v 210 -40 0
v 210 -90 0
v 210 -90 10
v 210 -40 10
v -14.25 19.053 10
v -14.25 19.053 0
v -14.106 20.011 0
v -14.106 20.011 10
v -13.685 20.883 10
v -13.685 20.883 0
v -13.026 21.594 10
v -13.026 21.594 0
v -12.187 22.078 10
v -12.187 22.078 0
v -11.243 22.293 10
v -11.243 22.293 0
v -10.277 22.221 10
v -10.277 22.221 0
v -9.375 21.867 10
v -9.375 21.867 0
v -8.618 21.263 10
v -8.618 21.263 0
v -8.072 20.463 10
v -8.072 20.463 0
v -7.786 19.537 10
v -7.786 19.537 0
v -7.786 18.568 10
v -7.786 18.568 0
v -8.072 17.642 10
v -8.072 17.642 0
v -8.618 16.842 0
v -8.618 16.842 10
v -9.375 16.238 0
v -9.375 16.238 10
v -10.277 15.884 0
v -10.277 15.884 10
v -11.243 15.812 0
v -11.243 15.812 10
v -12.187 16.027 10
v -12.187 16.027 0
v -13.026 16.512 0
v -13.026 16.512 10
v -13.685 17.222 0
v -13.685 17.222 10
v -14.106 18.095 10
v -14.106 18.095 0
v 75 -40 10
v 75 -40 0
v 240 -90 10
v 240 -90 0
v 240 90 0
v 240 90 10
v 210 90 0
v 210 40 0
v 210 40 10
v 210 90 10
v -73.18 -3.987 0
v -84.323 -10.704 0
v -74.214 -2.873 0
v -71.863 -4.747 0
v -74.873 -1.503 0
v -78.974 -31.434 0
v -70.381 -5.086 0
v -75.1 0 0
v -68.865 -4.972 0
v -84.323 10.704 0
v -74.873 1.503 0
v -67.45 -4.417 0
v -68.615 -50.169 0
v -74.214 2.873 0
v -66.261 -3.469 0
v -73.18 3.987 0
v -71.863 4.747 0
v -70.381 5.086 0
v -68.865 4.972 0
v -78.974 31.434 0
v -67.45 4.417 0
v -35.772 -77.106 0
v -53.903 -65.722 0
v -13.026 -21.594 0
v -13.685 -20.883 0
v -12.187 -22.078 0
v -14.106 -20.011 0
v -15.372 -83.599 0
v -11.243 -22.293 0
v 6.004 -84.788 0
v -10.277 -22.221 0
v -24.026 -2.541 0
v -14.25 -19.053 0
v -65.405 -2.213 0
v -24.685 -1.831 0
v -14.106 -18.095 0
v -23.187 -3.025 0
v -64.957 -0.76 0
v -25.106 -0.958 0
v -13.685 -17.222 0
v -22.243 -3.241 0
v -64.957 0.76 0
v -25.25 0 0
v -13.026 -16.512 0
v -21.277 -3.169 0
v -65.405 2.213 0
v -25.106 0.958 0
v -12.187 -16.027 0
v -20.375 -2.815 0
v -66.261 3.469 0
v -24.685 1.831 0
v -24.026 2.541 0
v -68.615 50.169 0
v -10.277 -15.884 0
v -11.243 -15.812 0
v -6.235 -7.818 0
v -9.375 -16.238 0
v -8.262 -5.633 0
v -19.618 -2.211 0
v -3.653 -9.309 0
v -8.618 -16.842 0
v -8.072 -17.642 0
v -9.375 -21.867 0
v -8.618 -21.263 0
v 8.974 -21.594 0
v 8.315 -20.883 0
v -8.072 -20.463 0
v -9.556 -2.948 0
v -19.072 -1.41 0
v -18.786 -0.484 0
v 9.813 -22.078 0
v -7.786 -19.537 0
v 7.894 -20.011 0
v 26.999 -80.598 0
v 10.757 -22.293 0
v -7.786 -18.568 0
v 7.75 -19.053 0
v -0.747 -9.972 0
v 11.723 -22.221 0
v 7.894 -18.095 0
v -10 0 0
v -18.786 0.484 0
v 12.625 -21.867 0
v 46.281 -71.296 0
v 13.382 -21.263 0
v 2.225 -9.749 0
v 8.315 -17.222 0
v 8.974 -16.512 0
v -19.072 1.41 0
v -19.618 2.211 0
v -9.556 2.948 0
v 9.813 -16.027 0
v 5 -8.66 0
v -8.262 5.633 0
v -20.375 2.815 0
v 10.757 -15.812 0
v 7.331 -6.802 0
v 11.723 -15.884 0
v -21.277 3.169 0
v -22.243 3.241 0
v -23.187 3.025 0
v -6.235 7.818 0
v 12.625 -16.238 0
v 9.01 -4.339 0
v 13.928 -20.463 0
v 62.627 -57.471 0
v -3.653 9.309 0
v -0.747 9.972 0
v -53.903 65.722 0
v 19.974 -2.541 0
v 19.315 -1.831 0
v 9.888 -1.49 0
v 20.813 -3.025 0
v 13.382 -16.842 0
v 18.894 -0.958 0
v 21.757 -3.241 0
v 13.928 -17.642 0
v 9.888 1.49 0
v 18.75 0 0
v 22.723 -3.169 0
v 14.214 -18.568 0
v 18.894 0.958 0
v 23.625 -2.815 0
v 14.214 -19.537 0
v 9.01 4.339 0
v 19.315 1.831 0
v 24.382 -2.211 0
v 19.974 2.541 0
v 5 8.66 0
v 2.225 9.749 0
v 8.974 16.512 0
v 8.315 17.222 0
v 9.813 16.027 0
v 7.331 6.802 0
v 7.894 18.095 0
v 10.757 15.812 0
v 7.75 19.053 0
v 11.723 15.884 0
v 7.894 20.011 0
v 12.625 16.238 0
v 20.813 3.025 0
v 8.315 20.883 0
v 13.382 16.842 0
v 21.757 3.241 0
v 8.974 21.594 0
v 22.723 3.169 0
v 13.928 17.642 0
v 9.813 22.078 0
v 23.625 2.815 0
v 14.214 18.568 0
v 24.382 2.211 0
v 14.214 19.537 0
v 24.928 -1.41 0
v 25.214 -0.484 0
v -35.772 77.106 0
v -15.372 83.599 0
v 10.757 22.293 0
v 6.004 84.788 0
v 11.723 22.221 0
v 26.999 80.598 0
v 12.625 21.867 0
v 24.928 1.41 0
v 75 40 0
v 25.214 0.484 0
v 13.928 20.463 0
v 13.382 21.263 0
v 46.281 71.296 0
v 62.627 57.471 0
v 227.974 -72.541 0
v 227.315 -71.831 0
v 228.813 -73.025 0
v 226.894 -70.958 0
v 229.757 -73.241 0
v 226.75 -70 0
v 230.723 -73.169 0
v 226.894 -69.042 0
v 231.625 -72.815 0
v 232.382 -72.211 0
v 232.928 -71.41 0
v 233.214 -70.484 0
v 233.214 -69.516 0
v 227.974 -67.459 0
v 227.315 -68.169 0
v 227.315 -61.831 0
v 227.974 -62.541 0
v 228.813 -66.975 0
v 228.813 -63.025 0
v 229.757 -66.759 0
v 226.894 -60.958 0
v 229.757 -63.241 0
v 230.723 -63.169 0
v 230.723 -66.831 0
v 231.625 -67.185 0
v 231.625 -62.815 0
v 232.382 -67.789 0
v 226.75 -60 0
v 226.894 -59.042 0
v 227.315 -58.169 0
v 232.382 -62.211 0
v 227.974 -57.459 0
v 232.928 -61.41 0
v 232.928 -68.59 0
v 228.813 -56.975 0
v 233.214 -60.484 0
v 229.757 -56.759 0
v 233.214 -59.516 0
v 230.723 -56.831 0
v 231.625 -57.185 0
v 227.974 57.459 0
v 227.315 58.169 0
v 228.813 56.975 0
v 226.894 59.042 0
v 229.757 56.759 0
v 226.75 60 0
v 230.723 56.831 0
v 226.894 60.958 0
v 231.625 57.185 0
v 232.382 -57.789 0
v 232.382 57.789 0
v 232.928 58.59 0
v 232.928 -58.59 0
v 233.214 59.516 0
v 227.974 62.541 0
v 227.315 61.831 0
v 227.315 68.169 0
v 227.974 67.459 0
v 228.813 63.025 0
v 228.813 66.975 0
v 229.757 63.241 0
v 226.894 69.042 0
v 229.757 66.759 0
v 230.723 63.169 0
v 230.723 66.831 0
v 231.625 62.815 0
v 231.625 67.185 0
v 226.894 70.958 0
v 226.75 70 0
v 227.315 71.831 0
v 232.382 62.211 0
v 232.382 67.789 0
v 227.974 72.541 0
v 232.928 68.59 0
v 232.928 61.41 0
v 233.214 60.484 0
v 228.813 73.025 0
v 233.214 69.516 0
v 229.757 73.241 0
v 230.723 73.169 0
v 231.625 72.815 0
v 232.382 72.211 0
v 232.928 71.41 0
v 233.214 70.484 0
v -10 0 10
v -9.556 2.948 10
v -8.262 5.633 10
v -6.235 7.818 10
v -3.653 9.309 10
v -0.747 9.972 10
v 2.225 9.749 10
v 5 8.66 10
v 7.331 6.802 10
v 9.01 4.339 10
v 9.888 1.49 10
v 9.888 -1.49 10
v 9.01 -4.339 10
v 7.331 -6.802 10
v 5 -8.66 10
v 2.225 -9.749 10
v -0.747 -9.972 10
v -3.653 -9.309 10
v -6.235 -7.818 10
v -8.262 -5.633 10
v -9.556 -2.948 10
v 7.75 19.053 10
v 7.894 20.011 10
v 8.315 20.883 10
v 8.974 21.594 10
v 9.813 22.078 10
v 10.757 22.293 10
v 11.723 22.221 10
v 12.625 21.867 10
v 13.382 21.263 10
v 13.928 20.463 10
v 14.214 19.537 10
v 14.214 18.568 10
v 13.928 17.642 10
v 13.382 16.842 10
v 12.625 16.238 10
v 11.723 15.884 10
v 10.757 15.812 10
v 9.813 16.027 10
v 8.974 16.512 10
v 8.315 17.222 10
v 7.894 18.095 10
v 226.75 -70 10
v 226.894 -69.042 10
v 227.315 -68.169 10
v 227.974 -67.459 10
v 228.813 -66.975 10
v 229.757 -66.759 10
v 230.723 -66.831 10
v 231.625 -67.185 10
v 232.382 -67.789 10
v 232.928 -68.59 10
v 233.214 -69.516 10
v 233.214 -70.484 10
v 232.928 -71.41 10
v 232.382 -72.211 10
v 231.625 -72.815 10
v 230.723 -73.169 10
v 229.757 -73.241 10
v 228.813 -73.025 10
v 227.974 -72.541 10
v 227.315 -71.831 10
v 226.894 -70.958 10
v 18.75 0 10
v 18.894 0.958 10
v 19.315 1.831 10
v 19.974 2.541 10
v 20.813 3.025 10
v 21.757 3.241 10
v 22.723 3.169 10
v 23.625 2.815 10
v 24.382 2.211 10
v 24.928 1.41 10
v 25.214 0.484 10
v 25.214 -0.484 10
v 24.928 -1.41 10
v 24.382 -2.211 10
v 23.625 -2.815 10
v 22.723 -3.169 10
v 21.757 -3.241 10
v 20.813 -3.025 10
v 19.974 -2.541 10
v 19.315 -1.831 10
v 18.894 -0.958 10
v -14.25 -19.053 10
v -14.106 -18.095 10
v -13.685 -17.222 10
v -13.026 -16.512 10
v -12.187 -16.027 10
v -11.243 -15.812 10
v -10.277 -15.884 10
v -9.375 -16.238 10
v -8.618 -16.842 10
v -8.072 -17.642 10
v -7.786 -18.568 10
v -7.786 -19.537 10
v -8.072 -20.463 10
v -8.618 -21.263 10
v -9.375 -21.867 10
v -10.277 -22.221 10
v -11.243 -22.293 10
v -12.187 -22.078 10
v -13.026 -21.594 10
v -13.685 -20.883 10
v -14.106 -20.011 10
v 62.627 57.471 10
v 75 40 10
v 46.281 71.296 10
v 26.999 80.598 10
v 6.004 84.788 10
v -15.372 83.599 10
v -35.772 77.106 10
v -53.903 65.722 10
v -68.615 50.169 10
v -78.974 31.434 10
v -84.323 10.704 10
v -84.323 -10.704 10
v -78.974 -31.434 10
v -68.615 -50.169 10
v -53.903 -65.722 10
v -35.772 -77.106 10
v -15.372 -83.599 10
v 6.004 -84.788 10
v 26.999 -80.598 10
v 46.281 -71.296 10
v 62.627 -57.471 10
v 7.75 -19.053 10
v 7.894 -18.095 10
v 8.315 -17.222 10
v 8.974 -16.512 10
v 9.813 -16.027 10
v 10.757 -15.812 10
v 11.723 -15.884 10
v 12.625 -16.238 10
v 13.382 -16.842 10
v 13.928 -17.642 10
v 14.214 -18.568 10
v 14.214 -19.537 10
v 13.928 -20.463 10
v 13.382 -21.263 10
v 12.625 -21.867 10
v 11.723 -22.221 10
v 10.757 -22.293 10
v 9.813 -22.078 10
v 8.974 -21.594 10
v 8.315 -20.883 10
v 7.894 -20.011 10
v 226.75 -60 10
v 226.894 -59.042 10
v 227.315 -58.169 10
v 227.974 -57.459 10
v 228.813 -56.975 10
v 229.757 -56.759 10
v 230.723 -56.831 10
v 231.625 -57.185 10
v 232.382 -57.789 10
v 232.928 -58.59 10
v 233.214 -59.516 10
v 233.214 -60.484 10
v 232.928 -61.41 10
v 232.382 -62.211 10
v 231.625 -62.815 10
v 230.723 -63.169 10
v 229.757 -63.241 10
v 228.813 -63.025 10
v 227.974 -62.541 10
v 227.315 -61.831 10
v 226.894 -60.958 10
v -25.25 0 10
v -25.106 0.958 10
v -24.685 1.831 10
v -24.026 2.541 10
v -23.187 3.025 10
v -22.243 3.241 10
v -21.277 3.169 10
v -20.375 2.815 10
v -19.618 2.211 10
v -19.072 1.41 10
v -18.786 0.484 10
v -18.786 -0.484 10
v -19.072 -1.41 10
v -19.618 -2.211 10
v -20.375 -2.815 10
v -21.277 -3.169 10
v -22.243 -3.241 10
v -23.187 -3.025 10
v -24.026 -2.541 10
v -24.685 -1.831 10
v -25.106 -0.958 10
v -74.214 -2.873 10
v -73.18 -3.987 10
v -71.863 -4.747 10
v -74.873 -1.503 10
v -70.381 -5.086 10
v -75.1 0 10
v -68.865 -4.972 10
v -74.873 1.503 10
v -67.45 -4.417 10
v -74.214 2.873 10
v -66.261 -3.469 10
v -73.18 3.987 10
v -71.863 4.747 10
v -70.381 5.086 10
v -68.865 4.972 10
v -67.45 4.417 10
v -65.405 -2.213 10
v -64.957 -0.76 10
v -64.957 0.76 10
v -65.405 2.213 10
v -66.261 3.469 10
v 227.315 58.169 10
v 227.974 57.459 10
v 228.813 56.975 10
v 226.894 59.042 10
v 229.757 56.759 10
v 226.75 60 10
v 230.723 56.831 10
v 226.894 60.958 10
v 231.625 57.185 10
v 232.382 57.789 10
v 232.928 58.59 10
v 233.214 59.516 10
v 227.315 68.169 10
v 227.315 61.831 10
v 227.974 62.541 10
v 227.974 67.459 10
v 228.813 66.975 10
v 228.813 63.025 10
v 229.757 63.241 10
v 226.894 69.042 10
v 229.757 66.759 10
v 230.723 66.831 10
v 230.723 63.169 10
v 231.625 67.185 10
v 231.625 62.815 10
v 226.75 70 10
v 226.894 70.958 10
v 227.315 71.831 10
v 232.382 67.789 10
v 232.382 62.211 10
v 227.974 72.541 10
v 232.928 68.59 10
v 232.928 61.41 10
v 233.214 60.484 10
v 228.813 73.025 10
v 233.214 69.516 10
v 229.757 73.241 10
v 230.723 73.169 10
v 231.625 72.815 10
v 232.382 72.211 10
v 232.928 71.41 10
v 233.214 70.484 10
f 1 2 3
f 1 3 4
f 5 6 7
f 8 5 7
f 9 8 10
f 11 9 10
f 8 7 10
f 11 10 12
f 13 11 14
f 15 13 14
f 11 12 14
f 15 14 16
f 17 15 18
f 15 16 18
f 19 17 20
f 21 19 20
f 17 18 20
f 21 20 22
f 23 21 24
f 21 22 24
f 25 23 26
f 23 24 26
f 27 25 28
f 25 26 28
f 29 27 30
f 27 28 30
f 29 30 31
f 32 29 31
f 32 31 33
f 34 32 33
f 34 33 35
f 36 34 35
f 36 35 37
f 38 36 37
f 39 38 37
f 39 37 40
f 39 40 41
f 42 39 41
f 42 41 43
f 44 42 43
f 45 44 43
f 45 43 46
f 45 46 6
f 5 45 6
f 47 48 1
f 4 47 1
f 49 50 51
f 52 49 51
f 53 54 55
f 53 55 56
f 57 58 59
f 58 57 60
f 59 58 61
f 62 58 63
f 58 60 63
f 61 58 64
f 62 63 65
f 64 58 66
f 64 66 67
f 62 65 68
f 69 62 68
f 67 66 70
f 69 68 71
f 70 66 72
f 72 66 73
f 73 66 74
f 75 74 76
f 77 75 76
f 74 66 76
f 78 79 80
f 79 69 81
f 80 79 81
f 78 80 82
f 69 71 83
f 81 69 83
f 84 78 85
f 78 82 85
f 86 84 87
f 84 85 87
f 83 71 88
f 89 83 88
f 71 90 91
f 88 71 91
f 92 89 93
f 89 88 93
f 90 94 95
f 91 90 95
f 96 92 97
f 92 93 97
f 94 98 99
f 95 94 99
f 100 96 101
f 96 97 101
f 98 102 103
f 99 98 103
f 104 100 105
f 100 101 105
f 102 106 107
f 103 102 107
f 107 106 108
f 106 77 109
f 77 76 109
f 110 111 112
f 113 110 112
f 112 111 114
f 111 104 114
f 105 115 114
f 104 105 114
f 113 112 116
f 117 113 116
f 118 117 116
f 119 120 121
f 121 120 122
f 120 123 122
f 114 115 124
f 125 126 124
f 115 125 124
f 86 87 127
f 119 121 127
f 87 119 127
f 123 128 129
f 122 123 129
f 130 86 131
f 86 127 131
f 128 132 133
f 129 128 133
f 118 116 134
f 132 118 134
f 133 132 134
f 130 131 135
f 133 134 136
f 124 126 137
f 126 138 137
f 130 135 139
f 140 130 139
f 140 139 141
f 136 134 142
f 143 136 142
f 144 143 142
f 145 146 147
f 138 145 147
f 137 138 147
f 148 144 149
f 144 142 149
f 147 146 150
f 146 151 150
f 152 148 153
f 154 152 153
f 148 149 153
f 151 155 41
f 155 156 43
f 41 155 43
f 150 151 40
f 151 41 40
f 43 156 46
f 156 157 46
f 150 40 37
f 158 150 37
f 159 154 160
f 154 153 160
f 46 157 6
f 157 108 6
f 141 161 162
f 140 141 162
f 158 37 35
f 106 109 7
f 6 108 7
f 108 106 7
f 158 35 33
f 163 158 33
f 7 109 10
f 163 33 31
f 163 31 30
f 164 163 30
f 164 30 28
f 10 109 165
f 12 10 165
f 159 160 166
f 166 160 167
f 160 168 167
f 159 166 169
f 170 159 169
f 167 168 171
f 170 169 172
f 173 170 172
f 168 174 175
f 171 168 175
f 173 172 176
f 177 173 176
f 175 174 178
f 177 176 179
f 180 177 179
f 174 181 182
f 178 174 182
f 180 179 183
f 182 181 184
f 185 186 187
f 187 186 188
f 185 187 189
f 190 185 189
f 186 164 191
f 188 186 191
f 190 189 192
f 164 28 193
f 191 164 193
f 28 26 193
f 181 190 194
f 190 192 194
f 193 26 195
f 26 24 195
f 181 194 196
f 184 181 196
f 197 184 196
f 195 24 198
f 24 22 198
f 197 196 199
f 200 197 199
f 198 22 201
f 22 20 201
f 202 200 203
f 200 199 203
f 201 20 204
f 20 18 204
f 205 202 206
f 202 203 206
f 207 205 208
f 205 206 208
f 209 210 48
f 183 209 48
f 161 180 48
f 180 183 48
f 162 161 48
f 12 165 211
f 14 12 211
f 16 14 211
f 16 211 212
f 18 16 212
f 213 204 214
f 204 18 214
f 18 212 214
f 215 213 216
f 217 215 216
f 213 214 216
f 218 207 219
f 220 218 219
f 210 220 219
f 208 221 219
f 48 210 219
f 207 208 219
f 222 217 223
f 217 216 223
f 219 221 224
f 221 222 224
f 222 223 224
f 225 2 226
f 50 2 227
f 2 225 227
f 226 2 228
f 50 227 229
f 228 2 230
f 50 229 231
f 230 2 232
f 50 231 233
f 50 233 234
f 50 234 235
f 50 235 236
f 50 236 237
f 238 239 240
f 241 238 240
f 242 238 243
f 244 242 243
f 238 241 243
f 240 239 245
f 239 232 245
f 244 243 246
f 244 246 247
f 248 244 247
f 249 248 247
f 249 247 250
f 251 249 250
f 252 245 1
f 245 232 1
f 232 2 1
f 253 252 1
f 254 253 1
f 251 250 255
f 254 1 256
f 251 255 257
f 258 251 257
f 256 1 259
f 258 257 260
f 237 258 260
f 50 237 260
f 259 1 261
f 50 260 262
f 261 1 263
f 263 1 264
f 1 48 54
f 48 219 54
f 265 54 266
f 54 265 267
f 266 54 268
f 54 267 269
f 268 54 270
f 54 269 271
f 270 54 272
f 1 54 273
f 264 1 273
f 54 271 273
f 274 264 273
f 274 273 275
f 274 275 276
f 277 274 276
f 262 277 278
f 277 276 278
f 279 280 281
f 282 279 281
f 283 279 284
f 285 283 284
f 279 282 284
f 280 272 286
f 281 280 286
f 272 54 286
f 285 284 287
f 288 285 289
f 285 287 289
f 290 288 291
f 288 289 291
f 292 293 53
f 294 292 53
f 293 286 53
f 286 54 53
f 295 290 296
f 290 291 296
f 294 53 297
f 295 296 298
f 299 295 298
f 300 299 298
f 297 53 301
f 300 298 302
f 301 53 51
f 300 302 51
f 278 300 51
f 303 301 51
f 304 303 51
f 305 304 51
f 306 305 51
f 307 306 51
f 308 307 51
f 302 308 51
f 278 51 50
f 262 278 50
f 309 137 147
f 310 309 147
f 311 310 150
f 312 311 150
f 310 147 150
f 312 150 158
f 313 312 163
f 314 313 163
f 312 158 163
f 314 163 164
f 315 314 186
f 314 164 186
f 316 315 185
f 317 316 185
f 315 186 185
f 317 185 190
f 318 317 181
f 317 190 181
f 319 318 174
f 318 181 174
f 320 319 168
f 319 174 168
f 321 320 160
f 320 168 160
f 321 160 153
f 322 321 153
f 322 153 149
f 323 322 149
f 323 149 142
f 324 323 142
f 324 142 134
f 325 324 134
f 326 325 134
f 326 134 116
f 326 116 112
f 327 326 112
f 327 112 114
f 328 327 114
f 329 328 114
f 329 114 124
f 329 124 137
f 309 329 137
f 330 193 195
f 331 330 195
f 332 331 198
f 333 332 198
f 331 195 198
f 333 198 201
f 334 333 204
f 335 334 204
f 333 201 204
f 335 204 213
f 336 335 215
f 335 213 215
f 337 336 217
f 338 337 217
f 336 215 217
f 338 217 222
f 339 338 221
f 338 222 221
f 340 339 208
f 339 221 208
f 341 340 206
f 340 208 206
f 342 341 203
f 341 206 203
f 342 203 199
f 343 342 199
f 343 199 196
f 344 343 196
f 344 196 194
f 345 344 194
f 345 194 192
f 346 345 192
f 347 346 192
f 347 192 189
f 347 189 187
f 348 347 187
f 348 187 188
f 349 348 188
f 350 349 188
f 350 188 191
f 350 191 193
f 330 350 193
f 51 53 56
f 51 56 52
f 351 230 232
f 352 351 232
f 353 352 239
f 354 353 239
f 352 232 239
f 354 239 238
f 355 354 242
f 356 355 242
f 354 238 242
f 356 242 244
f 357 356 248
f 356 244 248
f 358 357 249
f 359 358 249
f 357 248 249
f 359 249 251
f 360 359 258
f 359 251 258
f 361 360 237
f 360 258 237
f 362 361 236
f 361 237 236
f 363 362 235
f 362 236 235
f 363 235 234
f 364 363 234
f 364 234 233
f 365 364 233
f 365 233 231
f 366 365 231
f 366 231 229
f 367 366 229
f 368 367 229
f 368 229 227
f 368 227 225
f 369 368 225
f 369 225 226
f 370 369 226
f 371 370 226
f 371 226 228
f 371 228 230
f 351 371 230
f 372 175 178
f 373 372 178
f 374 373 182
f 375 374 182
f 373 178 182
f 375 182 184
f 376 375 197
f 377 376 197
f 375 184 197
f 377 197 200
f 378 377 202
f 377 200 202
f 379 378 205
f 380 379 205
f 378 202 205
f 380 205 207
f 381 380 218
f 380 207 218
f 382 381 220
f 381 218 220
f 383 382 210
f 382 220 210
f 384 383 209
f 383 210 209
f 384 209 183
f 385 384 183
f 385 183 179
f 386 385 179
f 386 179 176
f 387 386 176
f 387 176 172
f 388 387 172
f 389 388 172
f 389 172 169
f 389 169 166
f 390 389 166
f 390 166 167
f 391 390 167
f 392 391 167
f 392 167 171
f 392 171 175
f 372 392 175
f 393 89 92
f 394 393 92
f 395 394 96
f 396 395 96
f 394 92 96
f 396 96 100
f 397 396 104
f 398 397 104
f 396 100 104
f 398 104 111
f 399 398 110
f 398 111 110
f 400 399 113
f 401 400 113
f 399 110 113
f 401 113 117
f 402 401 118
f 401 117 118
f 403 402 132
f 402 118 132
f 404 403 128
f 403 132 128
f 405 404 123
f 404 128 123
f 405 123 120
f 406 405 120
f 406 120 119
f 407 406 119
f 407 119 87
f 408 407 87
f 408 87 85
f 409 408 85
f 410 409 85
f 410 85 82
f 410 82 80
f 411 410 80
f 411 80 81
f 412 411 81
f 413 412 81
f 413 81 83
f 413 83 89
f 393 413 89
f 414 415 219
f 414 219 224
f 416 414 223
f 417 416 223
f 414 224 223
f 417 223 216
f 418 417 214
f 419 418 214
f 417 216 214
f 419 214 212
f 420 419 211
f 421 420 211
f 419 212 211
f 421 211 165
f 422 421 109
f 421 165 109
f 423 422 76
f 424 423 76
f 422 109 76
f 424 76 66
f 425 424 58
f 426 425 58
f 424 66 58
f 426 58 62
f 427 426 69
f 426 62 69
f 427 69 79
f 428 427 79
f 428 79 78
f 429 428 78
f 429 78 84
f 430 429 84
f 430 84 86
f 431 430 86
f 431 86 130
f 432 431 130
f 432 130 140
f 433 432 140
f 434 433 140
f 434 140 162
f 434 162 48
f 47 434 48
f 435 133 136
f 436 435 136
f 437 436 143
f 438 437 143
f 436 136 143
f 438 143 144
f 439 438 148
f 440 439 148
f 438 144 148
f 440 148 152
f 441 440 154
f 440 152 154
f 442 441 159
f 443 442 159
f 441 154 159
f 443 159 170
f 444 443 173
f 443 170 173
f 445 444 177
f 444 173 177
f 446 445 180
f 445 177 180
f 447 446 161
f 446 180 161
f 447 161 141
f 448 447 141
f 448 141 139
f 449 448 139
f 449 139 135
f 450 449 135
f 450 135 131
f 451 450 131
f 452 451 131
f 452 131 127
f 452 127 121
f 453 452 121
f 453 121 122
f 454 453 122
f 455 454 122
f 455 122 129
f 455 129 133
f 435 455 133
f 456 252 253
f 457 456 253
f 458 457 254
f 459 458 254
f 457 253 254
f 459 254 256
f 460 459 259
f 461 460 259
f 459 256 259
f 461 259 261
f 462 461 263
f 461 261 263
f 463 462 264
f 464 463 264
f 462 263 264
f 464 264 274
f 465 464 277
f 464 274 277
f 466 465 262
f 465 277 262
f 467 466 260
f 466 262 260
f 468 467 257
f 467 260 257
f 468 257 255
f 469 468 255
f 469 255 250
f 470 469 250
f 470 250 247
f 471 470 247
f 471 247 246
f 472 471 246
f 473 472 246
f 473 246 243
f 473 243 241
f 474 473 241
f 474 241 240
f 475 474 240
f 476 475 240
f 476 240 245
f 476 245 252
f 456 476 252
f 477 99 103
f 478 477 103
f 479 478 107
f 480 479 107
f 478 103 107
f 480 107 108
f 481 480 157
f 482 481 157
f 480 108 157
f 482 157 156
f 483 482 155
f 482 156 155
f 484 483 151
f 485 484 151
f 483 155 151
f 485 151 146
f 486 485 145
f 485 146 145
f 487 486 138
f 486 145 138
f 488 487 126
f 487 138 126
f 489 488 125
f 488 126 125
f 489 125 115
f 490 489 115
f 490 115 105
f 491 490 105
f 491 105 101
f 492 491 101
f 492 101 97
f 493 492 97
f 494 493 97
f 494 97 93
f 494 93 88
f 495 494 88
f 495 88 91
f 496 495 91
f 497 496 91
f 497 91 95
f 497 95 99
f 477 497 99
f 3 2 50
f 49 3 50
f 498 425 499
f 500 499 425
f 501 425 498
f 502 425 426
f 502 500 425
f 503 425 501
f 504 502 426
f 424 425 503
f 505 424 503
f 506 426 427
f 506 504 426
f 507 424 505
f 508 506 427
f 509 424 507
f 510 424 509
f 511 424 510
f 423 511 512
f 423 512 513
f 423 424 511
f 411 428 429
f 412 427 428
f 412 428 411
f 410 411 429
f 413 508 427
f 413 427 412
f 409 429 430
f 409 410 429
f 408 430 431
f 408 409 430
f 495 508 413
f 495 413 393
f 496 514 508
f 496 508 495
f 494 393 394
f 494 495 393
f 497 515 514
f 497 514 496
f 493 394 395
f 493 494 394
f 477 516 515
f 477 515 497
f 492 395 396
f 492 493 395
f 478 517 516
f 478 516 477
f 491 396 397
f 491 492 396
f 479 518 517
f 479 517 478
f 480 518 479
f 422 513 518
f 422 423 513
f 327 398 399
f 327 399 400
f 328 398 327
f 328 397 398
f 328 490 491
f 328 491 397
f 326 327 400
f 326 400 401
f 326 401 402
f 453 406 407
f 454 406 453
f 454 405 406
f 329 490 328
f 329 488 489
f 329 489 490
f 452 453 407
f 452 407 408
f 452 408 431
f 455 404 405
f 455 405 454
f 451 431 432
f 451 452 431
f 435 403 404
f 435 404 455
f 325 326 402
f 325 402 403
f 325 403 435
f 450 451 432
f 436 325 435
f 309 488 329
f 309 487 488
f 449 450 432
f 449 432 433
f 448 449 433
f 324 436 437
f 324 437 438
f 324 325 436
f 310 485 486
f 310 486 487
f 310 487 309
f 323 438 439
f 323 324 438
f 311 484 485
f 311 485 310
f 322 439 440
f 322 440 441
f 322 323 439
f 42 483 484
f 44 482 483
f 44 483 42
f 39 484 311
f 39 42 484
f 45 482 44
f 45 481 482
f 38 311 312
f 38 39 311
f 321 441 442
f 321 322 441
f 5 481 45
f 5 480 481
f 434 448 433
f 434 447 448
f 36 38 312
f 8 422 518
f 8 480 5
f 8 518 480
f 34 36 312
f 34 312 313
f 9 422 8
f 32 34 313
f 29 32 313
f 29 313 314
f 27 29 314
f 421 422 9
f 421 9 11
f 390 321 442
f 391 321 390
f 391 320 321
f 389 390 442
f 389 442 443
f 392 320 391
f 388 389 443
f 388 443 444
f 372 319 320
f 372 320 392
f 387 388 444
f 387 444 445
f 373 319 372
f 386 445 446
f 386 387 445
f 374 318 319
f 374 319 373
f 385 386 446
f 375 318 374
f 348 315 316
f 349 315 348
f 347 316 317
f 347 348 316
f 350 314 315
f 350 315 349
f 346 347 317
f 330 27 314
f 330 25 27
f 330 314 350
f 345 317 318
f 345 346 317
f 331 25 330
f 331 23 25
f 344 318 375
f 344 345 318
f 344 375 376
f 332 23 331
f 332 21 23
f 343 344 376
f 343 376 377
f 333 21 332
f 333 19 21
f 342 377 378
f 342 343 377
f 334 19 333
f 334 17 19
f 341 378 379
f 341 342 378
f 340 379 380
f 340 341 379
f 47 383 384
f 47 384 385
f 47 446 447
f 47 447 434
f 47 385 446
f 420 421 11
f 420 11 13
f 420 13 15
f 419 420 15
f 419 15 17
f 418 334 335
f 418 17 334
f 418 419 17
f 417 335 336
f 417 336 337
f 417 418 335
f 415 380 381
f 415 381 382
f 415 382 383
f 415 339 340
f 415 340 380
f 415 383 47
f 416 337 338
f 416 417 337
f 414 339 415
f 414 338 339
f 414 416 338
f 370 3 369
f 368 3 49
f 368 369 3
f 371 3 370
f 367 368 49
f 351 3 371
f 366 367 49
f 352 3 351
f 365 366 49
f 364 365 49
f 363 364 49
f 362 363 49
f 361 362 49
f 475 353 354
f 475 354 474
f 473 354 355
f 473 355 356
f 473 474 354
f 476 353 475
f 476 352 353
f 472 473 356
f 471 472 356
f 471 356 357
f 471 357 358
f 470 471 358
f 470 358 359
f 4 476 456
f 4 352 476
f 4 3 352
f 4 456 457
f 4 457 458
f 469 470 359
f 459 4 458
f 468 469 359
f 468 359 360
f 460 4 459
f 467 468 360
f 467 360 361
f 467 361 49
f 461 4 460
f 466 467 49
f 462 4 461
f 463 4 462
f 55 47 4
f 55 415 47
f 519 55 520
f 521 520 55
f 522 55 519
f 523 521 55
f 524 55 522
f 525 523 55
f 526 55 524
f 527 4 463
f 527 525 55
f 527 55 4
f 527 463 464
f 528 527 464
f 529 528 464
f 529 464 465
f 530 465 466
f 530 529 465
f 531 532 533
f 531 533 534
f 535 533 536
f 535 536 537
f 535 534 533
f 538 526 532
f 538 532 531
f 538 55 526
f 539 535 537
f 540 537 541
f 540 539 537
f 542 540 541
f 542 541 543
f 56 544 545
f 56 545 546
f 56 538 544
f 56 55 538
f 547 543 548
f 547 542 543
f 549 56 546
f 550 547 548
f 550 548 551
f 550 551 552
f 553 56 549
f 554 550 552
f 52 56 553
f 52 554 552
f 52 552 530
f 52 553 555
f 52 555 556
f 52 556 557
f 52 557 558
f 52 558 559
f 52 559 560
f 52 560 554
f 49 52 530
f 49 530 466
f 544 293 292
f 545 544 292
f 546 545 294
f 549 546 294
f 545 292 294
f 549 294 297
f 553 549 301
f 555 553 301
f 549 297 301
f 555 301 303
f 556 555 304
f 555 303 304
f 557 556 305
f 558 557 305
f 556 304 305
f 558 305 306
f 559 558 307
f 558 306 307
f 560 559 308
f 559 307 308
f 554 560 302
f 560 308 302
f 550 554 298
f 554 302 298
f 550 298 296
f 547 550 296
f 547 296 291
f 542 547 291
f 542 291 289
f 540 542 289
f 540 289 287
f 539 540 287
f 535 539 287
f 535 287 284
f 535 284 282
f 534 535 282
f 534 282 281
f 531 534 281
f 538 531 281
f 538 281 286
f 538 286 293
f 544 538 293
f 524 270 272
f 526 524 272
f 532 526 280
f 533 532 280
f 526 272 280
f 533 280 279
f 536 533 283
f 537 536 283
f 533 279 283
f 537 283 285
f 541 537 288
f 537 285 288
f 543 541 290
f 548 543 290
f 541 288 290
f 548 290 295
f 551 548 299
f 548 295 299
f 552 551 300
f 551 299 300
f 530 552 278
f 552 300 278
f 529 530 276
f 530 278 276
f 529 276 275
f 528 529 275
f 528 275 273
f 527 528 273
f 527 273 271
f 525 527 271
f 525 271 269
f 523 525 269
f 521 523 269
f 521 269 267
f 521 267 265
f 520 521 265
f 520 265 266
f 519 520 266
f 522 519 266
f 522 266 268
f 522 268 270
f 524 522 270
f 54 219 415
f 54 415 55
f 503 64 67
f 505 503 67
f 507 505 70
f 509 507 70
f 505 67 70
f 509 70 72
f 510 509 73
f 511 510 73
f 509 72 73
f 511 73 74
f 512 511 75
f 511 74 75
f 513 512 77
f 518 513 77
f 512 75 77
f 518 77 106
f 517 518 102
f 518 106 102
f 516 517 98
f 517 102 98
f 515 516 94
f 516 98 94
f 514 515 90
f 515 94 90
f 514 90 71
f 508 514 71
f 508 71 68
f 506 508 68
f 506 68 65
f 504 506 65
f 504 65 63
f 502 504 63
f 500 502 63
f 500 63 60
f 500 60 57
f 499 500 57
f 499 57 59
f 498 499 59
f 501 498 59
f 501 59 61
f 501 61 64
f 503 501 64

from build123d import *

# Parameters (mm, degrees)
SKETCH_1_R          = 85
EXTRUDE_1_DEPTH     = 10
SKETCH_2_W          = 240
SKETCH_2_H          = 80
EXTRUDE_2_DEPTH     = 10
SKETCH_3_W          = 30
SKETCH_3_H          = 180
EXTRUDE_3_DEPTH     = 10
SKETCH_4_R          = 10
SKETCH_4_R_2        = 3.25
SKETCH_4_R_3        = 5.1
CUT_EXTRUDE_1_DEPTH = 11


with BuildPart() as part:
    # 草图1 → 凸台-拉伸1 (new body)
    with BuildSketch(Plane.XY):
        Circle(SKETCH_1_R)
    extrude(amount=EXTRUDE_1_DEPTH)

    # 草图2 → 凸台-拉伸2 (add)
    with BuildSketch(Plane.XY):
        with Locations((120, 0)):
            Rectangle(SKETCH_2_W, SKETCH_2_H)
    extrude(amount=EXTRUDE_2_DEPTH)

    # 草图3 → 凸台-拉伸3 (add)
    with BuildSketch(Plane.XY):
        with Locations((225, 0)):
            Rectangle(SKETCH_3_W, SKETCH_3_H)
    extrude(amount=EXTRUDE_3_DEPTH)

    # 草图4 → 切除-拉伸1 (cut)
    with BuildSketch(Plane(origin=(0, 0, 0), x_dir=(-1, 0, 0), z_dir=(0, 0, -1))):
        Circle(SKETCH_4_R)
        with Locations((-22, 0)):
            Circle(SKETCH_4_R_2)
        with Locations((-11, 19.052558883)):
            Circle(SKETCH_4_R_2)
        with Locations((11, 19.052558883)):
            Circle(SKETCH_4_R_2)
        with Locations((22, 0)):
            Circle(SKETCH_4_R_2)
        with Locations((11, -19.052558883)):
            Circle(SKETCH_4_R_2)
        with Locations((-11, -19.052558883)):
            Circle(SKETCH_4_R_2)
        with Locations((-230, -70)):
            Circle(SKETCH_4_R_2)
        with Locations((-230, -60)):
            Circle(SKETCH_4_R_2)
        with Locations((-230, 60)):
            Circle(SKETCH_4_R_2)
        with Locations((-230, 70)):
            Circle(SKETCH_4_R_2)
        with Locations((70, 0)):
            Circle(SKETCH_4_R_3)
    extrude(amount=-CUT_EXTRUDE_1_DEPTH, mode=Mode.SUBTRACT)


solid = part.part
